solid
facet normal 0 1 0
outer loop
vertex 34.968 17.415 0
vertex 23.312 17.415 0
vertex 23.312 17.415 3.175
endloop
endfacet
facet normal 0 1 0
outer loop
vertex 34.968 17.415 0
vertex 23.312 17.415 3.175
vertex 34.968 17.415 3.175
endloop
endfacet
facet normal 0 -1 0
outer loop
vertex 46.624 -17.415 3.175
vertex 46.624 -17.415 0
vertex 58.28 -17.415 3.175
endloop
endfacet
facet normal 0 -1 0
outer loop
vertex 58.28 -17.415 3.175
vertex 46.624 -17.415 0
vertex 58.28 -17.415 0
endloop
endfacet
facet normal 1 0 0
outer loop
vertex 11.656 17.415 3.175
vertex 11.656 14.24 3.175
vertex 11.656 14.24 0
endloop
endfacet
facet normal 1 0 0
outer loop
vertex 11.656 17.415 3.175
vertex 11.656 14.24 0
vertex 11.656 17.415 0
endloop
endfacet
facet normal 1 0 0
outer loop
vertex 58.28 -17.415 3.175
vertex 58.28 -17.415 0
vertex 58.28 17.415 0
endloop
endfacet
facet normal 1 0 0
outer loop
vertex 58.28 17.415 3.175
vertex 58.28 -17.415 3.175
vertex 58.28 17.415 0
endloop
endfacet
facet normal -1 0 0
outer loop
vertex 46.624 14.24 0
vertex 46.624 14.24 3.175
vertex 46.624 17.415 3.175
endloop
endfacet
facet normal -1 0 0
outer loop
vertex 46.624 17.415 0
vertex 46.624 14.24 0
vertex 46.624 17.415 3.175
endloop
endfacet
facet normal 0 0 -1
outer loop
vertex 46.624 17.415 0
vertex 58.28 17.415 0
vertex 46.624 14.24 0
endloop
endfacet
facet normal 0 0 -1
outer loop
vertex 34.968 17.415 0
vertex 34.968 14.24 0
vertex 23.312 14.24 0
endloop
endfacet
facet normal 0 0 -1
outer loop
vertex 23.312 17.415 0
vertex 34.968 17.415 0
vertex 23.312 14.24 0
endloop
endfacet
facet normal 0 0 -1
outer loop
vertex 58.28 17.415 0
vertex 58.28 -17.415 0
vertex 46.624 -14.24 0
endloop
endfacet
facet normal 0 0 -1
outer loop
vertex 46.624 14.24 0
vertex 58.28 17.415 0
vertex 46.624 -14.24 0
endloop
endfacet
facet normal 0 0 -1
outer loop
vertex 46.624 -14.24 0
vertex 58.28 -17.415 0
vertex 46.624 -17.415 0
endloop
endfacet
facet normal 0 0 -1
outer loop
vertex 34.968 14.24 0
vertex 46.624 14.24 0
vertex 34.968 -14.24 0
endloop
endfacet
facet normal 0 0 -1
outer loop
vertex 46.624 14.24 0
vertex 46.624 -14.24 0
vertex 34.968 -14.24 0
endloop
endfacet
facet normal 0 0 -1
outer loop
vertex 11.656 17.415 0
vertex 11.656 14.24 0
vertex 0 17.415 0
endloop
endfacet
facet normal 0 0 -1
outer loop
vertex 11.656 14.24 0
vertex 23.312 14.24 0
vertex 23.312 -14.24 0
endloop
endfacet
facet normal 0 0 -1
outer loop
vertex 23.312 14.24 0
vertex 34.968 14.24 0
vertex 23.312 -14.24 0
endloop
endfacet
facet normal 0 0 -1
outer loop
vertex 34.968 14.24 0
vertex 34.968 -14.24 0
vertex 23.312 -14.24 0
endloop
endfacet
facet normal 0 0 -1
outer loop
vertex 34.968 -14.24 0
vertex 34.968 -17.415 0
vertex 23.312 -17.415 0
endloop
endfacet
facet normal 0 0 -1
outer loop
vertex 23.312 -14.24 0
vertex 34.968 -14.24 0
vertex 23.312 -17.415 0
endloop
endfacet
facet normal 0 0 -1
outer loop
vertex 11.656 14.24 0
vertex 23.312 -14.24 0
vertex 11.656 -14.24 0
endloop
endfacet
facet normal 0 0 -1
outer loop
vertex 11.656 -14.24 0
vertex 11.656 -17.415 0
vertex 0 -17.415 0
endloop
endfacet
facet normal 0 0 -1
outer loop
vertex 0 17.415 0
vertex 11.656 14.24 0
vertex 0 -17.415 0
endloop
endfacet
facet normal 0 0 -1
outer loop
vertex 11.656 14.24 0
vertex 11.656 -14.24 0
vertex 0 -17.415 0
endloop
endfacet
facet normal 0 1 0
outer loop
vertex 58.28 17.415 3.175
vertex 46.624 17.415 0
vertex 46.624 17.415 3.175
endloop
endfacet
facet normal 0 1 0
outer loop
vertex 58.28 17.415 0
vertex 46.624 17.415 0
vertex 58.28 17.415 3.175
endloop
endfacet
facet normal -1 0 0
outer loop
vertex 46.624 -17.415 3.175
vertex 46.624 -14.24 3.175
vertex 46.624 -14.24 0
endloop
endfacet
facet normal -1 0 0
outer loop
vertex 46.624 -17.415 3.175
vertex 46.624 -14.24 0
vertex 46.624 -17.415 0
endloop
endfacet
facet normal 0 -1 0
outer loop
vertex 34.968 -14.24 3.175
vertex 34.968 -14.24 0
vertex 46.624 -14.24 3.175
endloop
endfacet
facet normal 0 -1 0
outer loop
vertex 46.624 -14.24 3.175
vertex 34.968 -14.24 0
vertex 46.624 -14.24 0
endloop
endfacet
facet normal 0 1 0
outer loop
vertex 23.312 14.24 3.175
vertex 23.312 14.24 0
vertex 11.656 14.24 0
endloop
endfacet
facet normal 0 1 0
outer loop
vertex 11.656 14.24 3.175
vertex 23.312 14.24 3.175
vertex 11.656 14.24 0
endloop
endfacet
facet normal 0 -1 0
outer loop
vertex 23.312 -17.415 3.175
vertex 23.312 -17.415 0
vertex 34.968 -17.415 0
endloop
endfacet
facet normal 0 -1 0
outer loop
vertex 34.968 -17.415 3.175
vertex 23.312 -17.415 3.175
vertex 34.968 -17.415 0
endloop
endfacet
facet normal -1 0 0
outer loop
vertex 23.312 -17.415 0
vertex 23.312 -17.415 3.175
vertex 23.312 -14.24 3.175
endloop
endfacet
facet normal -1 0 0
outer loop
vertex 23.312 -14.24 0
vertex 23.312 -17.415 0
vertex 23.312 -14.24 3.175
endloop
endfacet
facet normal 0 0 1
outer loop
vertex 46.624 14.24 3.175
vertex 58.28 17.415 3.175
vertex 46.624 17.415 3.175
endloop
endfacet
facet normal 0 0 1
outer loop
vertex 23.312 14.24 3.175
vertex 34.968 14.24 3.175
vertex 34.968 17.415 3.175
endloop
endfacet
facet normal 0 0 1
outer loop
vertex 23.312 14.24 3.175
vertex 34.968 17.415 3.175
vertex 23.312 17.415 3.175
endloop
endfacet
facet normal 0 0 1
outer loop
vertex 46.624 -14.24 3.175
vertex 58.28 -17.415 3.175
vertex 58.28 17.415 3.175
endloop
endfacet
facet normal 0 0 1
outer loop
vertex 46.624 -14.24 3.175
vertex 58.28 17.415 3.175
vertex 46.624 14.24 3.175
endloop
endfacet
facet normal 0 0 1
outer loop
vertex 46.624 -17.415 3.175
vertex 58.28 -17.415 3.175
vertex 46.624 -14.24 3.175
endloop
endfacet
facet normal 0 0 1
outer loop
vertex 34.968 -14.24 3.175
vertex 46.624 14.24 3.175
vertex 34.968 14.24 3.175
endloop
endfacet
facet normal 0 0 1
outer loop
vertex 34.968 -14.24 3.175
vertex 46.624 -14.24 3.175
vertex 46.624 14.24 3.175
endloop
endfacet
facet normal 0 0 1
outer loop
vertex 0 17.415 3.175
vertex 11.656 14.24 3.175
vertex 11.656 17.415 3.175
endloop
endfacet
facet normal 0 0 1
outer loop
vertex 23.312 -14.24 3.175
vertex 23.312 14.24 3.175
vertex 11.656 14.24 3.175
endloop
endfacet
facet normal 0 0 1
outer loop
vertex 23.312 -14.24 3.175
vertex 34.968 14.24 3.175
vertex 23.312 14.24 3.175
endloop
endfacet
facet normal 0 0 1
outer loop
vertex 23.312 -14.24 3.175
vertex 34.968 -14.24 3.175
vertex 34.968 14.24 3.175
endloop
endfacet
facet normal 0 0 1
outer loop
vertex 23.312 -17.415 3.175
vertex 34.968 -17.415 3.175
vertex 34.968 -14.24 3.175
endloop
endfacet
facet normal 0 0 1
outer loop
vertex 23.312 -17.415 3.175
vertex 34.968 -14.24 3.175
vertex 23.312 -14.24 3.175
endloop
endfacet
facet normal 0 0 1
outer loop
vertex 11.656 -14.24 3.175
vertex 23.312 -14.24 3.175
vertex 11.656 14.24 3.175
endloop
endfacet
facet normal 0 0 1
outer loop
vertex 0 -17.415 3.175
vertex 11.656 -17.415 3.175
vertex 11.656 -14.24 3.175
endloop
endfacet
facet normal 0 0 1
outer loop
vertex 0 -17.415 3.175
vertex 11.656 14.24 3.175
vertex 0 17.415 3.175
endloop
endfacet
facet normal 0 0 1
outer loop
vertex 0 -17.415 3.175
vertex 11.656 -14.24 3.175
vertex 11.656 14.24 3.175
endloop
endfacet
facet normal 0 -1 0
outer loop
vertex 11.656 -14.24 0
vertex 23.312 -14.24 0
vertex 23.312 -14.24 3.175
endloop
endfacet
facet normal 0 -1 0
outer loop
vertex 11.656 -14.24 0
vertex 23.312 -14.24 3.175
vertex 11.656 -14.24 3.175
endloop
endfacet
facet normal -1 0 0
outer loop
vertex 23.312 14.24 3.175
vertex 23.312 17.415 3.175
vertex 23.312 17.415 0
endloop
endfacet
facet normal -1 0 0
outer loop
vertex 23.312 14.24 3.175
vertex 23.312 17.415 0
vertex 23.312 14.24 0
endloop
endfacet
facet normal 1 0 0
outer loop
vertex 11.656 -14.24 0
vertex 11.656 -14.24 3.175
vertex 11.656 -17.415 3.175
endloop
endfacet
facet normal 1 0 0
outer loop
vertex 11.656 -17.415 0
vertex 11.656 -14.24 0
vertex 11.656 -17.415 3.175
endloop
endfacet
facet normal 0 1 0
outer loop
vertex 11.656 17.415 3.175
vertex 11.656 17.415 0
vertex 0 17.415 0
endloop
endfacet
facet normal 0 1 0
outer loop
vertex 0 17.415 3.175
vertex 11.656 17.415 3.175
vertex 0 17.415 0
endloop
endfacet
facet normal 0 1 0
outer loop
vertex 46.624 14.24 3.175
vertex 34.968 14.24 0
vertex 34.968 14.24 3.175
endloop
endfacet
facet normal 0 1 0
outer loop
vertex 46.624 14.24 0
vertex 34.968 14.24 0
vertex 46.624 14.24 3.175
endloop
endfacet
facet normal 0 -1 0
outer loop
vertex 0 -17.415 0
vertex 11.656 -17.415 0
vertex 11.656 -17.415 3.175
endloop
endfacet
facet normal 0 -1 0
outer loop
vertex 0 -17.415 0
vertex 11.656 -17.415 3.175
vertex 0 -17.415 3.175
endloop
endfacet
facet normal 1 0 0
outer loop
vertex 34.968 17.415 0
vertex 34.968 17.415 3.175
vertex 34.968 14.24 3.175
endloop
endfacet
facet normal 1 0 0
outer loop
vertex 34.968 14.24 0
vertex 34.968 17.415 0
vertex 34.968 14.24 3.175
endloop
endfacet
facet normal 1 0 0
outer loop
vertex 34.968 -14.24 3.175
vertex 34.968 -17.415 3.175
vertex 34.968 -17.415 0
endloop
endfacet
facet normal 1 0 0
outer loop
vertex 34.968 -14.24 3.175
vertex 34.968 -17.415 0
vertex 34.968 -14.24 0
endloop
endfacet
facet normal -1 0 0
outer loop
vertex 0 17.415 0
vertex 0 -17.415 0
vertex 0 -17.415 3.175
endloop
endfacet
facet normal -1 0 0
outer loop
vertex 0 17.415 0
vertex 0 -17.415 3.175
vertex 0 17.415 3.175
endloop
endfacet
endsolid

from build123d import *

# Parameters (mm, degrees)
BOSS_EXTRUDE1_DEPTH = 3.175


with BuildPart() as part:
    # Sketch1 → Boss-Extrude1 (new body)
    with BuildSketch(Plane.XY):
        Polygon((0, 0), (29.14, 0), (29.14, 14.24), (29.14, 17.415), (23.312, 17.415), (23.312, 14.24), (11.656, 14.24), (11.656, 17.415), (0, 17.415), (0, 14.24), align=None)
    extrude(amount=BOSS_EXTRUDE1_DEPTH)

    # Mirror1: part across plane


with BuildPart() as part_1:
    add(part.part)
    add(part.part.mirror(Plane(origin=(0, 0, 3.175), x_dir=(0, 0, 1), z_dir=(0, 1, 0))))

    # Mirror3: part across plane


with BuildPart() as part_2:
    add(part_1.part)
    add(part_1.part.mirror(Plane(origin=(29.14, 14.24, 3.175), x_dir=(0, 0, 1), z_dir=(-1, 0, 0))))


solid = part_2.part
